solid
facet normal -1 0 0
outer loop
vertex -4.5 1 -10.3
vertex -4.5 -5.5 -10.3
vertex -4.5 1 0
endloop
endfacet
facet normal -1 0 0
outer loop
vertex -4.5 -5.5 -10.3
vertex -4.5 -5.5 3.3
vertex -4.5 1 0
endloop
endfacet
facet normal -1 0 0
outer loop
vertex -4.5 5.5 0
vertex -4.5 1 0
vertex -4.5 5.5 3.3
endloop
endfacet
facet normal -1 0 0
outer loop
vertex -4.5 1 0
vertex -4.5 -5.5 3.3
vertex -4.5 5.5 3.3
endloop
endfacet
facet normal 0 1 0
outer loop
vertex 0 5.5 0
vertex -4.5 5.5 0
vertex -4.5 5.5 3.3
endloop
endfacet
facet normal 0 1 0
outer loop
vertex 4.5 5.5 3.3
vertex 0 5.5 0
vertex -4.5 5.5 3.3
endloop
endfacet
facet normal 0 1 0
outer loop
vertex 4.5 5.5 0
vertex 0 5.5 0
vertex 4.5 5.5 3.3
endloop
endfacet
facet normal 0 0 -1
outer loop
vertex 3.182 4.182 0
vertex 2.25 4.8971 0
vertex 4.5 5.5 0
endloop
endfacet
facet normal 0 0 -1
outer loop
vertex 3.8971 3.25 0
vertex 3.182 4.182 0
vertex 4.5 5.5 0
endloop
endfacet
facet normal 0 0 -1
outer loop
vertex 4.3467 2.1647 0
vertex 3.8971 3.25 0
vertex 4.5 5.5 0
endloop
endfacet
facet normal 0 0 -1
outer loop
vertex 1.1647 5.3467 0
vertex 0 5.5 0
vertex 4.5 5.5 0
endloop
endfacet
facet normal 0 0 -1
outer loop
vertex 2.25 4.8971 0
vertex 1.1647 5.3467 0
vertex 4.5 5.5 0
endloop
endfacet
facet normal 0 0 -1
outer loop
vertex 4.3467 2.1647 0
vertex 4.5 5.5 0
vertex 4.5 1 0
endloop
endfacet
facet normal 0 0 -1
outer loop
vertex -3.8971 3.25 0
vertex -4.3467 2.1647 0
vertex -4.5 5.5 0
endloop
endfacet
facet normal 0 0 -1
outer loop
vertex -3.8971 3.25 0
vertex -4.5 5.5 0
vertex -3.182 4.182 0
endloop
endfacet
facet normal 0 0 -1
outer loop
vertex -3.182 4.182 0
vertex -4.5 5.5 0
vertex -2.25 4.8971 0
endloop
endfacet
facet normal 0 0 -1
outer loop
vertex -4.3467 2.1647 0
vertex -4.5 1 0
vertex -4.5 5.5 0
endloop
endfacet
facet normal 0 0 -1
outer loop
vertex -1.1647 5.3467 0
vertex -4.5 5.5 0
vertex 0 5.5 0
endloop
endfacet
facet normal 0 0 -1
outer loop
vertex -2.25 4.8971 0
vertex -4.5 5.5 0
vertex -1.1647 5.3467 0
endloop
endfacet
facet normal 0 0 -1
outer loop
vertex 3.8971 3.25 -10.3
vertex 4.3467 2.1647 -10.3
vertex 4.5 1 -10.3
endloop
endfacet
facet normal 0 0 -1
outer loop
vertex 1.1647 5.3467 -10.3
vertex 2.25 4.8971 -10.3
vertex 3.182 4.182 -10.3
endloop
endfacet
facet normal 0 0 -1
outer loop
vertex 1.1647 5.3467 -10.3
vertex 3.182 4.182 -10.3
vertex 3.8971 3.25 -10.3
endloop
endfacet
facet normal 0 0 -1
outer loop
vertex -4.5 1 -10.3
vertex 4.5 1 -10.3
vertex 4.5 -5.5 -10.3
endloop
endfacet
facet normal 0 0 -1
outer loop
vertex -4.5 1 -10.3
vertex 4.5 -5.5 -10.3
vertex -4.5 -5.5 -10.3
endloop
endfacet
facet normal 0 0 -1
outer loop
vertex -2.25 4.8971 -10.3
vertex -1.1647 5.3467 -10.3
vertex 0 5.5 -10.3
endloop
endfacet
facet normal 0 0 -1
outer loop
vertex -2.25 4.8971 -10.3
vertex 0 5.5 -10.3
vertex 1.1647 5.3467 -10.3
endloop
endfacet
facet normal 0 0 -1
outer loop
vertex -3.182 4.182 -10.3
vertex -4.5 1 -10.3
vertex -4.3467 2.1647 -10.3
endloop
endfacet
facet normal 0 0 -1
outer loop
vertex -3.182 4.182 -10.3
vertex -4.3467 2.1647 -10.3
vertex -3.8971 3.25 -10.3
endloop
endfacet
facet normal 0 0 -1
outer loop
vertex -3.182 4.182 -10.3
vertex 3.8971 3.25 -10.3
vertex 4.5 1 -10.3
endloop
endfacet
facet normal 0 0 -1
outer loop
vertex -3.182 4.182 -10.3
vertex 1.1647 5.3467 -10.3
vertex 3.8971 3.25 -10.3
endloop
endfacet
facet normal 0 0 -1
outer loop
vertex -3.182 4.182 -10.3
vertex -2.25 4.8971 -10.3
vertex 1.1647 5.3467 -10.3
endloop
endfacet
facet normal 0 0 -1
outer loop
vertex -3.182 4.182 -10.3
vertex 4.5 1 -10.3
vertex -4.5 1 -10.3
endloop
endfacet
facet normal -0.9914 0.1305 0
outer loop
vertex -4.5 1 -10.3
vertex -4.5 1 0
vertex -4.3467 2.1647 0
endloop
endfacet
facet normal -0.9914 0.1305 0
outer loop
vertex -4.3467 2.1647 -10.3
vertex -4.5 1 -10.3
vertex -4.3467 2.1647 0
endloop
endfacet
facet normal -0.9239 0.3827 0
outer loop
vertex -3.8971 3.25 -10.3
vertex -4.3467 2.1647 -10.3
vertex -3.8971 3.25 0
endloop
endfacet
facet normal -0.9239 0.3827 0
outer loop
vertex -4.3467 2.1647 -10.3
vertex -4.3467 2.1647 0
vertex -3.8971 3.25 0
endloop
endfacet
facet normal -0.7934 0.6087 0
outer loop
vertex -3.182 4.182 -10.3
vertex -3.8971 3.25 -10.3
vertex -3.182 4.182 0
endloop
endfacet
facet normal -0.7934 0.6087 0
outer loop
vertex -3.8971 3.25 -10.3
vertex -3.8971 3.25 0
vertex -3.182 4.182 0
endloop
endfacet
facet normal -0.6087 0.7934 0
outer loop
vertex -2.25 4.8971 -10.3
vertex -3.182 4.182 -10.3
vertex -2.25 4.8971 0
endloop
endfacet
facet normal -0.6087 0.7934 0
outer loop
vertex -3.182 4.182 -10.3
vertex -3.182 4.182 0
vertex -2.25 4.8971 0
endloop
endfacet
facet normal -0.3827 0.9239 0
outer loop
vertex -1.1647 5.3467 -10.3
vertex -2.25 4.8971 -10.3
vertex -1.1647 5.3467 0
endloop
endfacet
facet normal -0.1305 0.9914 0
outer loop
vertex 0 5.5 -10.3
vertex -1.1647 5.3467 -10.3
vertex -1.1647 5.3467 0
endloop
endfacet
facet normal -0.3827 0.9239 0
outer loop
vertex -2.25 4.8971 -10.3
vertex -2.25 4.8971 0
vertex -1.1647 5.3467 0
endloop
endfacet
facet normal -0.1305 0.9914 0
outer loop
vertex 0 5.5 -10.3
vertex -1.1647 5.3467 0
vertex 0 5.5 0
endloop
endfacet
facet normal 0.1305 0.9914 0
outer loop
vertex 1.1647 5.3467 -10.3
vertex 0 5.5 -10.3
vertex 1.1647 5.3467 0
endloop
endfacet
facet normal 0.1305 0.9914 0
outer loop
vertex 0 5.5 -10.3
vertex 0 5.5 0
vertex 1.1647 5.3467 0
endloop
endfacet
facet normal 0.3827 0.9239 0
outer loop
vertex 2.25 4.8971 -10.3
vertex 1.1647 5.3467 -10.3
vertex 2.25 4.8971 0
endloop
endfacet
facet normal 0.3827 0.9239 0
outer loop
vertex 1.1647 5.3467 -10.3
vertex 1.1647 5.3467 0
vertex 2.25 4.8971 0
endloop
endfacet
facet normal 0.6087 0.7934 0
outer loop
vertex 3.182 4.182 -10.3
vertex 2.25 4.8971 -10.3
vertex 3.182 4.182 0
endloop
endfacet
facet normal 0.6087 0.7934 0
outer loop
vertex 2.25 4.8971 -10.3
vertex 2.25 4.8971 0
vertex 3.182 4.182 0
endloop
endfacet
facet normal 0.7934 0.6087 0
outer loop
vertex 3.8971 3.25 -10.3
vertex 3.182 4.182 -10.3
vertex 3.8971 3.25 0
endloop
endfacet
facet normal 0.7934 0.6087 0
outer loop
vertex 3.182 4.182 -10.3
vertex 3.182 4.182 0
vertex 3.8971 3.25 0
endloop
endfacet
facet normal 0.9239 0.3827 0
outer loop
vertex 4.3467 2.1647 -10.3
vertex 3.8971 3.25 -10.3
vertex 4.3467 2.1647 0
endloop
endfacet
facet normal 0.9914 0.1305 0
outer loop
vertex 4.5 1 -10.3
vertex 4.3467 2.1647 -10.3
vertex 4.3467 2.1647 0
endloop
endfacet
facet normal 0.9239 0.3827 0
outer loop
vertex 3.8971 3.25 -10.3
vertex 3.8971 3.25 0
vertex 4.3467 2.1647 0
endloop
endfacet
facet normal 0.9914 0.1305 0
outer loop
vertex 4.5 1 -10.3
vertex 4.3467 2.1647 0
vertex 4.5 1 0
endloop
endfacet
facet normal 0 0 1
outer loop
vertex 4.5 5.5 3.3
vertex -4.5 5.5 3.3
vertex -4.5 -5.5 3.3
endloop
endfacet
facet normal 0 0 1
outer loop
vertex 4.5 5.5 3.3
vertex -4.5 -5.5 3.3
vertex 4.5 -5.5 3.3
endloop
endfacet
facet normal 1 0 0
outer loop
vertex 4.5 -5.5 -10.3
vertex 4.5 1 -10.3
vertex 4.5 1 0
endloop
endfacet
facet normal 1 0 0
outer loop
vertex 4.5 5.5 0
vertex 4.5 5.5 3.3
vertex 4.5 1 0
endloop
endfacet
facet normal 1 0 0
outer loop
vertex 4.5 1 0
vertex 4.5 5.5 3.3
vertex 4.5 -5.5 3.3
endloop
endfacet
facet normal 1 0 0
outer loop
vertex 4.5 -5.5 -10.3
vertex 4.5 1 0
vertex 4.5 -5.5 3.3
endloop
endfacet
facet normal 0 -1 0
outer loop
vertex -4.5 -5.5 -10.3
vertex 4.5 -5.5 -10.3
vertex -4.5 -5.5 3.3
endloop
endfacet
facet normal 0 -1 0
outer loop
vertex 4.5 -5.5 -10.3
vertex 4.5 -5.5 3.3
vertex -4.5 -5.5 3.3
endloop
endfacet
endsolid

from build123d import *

# Parameters (mm, degrees)
SKETCH1_W           = 9
SKETCH1_H           = 11
BOSS_EXTRUDE1_DEPTH = 3.3
BOSS_EXTRUDE2_DEPTH = 10.3


with BuildPart() as part:
    # Sketch1 → Boss-Extrude1 (new body)
    with BuildSketch(Plane.XY):
        Rectangle(SKETCH1_W, SKETCH1_H)
    extrude(amount=BOSS_EXTRUDE1_DEPTH)

    # Sketch2 → Boss-Extrude2 (add)
    with BuildSketch(Plane(origin=(0, 0, 0), x_dir=(-1, 0, 0), z_dir=(0, 0, -1))):
        with BuildLine():
            Line((-4.5, 1), (-4.5, -5.5))
            Line((-4.5, -5.5), (4.5, -5.5))
            Line((4.5, -5.5), (4.5, 1))
            ThreePointArc((4.5, 1), (0, 5.5), (-4.5, 1))
        make_face()
    extrude(amount=BOSS_EXTRUDE2_DEPTH)


solid = part.part
